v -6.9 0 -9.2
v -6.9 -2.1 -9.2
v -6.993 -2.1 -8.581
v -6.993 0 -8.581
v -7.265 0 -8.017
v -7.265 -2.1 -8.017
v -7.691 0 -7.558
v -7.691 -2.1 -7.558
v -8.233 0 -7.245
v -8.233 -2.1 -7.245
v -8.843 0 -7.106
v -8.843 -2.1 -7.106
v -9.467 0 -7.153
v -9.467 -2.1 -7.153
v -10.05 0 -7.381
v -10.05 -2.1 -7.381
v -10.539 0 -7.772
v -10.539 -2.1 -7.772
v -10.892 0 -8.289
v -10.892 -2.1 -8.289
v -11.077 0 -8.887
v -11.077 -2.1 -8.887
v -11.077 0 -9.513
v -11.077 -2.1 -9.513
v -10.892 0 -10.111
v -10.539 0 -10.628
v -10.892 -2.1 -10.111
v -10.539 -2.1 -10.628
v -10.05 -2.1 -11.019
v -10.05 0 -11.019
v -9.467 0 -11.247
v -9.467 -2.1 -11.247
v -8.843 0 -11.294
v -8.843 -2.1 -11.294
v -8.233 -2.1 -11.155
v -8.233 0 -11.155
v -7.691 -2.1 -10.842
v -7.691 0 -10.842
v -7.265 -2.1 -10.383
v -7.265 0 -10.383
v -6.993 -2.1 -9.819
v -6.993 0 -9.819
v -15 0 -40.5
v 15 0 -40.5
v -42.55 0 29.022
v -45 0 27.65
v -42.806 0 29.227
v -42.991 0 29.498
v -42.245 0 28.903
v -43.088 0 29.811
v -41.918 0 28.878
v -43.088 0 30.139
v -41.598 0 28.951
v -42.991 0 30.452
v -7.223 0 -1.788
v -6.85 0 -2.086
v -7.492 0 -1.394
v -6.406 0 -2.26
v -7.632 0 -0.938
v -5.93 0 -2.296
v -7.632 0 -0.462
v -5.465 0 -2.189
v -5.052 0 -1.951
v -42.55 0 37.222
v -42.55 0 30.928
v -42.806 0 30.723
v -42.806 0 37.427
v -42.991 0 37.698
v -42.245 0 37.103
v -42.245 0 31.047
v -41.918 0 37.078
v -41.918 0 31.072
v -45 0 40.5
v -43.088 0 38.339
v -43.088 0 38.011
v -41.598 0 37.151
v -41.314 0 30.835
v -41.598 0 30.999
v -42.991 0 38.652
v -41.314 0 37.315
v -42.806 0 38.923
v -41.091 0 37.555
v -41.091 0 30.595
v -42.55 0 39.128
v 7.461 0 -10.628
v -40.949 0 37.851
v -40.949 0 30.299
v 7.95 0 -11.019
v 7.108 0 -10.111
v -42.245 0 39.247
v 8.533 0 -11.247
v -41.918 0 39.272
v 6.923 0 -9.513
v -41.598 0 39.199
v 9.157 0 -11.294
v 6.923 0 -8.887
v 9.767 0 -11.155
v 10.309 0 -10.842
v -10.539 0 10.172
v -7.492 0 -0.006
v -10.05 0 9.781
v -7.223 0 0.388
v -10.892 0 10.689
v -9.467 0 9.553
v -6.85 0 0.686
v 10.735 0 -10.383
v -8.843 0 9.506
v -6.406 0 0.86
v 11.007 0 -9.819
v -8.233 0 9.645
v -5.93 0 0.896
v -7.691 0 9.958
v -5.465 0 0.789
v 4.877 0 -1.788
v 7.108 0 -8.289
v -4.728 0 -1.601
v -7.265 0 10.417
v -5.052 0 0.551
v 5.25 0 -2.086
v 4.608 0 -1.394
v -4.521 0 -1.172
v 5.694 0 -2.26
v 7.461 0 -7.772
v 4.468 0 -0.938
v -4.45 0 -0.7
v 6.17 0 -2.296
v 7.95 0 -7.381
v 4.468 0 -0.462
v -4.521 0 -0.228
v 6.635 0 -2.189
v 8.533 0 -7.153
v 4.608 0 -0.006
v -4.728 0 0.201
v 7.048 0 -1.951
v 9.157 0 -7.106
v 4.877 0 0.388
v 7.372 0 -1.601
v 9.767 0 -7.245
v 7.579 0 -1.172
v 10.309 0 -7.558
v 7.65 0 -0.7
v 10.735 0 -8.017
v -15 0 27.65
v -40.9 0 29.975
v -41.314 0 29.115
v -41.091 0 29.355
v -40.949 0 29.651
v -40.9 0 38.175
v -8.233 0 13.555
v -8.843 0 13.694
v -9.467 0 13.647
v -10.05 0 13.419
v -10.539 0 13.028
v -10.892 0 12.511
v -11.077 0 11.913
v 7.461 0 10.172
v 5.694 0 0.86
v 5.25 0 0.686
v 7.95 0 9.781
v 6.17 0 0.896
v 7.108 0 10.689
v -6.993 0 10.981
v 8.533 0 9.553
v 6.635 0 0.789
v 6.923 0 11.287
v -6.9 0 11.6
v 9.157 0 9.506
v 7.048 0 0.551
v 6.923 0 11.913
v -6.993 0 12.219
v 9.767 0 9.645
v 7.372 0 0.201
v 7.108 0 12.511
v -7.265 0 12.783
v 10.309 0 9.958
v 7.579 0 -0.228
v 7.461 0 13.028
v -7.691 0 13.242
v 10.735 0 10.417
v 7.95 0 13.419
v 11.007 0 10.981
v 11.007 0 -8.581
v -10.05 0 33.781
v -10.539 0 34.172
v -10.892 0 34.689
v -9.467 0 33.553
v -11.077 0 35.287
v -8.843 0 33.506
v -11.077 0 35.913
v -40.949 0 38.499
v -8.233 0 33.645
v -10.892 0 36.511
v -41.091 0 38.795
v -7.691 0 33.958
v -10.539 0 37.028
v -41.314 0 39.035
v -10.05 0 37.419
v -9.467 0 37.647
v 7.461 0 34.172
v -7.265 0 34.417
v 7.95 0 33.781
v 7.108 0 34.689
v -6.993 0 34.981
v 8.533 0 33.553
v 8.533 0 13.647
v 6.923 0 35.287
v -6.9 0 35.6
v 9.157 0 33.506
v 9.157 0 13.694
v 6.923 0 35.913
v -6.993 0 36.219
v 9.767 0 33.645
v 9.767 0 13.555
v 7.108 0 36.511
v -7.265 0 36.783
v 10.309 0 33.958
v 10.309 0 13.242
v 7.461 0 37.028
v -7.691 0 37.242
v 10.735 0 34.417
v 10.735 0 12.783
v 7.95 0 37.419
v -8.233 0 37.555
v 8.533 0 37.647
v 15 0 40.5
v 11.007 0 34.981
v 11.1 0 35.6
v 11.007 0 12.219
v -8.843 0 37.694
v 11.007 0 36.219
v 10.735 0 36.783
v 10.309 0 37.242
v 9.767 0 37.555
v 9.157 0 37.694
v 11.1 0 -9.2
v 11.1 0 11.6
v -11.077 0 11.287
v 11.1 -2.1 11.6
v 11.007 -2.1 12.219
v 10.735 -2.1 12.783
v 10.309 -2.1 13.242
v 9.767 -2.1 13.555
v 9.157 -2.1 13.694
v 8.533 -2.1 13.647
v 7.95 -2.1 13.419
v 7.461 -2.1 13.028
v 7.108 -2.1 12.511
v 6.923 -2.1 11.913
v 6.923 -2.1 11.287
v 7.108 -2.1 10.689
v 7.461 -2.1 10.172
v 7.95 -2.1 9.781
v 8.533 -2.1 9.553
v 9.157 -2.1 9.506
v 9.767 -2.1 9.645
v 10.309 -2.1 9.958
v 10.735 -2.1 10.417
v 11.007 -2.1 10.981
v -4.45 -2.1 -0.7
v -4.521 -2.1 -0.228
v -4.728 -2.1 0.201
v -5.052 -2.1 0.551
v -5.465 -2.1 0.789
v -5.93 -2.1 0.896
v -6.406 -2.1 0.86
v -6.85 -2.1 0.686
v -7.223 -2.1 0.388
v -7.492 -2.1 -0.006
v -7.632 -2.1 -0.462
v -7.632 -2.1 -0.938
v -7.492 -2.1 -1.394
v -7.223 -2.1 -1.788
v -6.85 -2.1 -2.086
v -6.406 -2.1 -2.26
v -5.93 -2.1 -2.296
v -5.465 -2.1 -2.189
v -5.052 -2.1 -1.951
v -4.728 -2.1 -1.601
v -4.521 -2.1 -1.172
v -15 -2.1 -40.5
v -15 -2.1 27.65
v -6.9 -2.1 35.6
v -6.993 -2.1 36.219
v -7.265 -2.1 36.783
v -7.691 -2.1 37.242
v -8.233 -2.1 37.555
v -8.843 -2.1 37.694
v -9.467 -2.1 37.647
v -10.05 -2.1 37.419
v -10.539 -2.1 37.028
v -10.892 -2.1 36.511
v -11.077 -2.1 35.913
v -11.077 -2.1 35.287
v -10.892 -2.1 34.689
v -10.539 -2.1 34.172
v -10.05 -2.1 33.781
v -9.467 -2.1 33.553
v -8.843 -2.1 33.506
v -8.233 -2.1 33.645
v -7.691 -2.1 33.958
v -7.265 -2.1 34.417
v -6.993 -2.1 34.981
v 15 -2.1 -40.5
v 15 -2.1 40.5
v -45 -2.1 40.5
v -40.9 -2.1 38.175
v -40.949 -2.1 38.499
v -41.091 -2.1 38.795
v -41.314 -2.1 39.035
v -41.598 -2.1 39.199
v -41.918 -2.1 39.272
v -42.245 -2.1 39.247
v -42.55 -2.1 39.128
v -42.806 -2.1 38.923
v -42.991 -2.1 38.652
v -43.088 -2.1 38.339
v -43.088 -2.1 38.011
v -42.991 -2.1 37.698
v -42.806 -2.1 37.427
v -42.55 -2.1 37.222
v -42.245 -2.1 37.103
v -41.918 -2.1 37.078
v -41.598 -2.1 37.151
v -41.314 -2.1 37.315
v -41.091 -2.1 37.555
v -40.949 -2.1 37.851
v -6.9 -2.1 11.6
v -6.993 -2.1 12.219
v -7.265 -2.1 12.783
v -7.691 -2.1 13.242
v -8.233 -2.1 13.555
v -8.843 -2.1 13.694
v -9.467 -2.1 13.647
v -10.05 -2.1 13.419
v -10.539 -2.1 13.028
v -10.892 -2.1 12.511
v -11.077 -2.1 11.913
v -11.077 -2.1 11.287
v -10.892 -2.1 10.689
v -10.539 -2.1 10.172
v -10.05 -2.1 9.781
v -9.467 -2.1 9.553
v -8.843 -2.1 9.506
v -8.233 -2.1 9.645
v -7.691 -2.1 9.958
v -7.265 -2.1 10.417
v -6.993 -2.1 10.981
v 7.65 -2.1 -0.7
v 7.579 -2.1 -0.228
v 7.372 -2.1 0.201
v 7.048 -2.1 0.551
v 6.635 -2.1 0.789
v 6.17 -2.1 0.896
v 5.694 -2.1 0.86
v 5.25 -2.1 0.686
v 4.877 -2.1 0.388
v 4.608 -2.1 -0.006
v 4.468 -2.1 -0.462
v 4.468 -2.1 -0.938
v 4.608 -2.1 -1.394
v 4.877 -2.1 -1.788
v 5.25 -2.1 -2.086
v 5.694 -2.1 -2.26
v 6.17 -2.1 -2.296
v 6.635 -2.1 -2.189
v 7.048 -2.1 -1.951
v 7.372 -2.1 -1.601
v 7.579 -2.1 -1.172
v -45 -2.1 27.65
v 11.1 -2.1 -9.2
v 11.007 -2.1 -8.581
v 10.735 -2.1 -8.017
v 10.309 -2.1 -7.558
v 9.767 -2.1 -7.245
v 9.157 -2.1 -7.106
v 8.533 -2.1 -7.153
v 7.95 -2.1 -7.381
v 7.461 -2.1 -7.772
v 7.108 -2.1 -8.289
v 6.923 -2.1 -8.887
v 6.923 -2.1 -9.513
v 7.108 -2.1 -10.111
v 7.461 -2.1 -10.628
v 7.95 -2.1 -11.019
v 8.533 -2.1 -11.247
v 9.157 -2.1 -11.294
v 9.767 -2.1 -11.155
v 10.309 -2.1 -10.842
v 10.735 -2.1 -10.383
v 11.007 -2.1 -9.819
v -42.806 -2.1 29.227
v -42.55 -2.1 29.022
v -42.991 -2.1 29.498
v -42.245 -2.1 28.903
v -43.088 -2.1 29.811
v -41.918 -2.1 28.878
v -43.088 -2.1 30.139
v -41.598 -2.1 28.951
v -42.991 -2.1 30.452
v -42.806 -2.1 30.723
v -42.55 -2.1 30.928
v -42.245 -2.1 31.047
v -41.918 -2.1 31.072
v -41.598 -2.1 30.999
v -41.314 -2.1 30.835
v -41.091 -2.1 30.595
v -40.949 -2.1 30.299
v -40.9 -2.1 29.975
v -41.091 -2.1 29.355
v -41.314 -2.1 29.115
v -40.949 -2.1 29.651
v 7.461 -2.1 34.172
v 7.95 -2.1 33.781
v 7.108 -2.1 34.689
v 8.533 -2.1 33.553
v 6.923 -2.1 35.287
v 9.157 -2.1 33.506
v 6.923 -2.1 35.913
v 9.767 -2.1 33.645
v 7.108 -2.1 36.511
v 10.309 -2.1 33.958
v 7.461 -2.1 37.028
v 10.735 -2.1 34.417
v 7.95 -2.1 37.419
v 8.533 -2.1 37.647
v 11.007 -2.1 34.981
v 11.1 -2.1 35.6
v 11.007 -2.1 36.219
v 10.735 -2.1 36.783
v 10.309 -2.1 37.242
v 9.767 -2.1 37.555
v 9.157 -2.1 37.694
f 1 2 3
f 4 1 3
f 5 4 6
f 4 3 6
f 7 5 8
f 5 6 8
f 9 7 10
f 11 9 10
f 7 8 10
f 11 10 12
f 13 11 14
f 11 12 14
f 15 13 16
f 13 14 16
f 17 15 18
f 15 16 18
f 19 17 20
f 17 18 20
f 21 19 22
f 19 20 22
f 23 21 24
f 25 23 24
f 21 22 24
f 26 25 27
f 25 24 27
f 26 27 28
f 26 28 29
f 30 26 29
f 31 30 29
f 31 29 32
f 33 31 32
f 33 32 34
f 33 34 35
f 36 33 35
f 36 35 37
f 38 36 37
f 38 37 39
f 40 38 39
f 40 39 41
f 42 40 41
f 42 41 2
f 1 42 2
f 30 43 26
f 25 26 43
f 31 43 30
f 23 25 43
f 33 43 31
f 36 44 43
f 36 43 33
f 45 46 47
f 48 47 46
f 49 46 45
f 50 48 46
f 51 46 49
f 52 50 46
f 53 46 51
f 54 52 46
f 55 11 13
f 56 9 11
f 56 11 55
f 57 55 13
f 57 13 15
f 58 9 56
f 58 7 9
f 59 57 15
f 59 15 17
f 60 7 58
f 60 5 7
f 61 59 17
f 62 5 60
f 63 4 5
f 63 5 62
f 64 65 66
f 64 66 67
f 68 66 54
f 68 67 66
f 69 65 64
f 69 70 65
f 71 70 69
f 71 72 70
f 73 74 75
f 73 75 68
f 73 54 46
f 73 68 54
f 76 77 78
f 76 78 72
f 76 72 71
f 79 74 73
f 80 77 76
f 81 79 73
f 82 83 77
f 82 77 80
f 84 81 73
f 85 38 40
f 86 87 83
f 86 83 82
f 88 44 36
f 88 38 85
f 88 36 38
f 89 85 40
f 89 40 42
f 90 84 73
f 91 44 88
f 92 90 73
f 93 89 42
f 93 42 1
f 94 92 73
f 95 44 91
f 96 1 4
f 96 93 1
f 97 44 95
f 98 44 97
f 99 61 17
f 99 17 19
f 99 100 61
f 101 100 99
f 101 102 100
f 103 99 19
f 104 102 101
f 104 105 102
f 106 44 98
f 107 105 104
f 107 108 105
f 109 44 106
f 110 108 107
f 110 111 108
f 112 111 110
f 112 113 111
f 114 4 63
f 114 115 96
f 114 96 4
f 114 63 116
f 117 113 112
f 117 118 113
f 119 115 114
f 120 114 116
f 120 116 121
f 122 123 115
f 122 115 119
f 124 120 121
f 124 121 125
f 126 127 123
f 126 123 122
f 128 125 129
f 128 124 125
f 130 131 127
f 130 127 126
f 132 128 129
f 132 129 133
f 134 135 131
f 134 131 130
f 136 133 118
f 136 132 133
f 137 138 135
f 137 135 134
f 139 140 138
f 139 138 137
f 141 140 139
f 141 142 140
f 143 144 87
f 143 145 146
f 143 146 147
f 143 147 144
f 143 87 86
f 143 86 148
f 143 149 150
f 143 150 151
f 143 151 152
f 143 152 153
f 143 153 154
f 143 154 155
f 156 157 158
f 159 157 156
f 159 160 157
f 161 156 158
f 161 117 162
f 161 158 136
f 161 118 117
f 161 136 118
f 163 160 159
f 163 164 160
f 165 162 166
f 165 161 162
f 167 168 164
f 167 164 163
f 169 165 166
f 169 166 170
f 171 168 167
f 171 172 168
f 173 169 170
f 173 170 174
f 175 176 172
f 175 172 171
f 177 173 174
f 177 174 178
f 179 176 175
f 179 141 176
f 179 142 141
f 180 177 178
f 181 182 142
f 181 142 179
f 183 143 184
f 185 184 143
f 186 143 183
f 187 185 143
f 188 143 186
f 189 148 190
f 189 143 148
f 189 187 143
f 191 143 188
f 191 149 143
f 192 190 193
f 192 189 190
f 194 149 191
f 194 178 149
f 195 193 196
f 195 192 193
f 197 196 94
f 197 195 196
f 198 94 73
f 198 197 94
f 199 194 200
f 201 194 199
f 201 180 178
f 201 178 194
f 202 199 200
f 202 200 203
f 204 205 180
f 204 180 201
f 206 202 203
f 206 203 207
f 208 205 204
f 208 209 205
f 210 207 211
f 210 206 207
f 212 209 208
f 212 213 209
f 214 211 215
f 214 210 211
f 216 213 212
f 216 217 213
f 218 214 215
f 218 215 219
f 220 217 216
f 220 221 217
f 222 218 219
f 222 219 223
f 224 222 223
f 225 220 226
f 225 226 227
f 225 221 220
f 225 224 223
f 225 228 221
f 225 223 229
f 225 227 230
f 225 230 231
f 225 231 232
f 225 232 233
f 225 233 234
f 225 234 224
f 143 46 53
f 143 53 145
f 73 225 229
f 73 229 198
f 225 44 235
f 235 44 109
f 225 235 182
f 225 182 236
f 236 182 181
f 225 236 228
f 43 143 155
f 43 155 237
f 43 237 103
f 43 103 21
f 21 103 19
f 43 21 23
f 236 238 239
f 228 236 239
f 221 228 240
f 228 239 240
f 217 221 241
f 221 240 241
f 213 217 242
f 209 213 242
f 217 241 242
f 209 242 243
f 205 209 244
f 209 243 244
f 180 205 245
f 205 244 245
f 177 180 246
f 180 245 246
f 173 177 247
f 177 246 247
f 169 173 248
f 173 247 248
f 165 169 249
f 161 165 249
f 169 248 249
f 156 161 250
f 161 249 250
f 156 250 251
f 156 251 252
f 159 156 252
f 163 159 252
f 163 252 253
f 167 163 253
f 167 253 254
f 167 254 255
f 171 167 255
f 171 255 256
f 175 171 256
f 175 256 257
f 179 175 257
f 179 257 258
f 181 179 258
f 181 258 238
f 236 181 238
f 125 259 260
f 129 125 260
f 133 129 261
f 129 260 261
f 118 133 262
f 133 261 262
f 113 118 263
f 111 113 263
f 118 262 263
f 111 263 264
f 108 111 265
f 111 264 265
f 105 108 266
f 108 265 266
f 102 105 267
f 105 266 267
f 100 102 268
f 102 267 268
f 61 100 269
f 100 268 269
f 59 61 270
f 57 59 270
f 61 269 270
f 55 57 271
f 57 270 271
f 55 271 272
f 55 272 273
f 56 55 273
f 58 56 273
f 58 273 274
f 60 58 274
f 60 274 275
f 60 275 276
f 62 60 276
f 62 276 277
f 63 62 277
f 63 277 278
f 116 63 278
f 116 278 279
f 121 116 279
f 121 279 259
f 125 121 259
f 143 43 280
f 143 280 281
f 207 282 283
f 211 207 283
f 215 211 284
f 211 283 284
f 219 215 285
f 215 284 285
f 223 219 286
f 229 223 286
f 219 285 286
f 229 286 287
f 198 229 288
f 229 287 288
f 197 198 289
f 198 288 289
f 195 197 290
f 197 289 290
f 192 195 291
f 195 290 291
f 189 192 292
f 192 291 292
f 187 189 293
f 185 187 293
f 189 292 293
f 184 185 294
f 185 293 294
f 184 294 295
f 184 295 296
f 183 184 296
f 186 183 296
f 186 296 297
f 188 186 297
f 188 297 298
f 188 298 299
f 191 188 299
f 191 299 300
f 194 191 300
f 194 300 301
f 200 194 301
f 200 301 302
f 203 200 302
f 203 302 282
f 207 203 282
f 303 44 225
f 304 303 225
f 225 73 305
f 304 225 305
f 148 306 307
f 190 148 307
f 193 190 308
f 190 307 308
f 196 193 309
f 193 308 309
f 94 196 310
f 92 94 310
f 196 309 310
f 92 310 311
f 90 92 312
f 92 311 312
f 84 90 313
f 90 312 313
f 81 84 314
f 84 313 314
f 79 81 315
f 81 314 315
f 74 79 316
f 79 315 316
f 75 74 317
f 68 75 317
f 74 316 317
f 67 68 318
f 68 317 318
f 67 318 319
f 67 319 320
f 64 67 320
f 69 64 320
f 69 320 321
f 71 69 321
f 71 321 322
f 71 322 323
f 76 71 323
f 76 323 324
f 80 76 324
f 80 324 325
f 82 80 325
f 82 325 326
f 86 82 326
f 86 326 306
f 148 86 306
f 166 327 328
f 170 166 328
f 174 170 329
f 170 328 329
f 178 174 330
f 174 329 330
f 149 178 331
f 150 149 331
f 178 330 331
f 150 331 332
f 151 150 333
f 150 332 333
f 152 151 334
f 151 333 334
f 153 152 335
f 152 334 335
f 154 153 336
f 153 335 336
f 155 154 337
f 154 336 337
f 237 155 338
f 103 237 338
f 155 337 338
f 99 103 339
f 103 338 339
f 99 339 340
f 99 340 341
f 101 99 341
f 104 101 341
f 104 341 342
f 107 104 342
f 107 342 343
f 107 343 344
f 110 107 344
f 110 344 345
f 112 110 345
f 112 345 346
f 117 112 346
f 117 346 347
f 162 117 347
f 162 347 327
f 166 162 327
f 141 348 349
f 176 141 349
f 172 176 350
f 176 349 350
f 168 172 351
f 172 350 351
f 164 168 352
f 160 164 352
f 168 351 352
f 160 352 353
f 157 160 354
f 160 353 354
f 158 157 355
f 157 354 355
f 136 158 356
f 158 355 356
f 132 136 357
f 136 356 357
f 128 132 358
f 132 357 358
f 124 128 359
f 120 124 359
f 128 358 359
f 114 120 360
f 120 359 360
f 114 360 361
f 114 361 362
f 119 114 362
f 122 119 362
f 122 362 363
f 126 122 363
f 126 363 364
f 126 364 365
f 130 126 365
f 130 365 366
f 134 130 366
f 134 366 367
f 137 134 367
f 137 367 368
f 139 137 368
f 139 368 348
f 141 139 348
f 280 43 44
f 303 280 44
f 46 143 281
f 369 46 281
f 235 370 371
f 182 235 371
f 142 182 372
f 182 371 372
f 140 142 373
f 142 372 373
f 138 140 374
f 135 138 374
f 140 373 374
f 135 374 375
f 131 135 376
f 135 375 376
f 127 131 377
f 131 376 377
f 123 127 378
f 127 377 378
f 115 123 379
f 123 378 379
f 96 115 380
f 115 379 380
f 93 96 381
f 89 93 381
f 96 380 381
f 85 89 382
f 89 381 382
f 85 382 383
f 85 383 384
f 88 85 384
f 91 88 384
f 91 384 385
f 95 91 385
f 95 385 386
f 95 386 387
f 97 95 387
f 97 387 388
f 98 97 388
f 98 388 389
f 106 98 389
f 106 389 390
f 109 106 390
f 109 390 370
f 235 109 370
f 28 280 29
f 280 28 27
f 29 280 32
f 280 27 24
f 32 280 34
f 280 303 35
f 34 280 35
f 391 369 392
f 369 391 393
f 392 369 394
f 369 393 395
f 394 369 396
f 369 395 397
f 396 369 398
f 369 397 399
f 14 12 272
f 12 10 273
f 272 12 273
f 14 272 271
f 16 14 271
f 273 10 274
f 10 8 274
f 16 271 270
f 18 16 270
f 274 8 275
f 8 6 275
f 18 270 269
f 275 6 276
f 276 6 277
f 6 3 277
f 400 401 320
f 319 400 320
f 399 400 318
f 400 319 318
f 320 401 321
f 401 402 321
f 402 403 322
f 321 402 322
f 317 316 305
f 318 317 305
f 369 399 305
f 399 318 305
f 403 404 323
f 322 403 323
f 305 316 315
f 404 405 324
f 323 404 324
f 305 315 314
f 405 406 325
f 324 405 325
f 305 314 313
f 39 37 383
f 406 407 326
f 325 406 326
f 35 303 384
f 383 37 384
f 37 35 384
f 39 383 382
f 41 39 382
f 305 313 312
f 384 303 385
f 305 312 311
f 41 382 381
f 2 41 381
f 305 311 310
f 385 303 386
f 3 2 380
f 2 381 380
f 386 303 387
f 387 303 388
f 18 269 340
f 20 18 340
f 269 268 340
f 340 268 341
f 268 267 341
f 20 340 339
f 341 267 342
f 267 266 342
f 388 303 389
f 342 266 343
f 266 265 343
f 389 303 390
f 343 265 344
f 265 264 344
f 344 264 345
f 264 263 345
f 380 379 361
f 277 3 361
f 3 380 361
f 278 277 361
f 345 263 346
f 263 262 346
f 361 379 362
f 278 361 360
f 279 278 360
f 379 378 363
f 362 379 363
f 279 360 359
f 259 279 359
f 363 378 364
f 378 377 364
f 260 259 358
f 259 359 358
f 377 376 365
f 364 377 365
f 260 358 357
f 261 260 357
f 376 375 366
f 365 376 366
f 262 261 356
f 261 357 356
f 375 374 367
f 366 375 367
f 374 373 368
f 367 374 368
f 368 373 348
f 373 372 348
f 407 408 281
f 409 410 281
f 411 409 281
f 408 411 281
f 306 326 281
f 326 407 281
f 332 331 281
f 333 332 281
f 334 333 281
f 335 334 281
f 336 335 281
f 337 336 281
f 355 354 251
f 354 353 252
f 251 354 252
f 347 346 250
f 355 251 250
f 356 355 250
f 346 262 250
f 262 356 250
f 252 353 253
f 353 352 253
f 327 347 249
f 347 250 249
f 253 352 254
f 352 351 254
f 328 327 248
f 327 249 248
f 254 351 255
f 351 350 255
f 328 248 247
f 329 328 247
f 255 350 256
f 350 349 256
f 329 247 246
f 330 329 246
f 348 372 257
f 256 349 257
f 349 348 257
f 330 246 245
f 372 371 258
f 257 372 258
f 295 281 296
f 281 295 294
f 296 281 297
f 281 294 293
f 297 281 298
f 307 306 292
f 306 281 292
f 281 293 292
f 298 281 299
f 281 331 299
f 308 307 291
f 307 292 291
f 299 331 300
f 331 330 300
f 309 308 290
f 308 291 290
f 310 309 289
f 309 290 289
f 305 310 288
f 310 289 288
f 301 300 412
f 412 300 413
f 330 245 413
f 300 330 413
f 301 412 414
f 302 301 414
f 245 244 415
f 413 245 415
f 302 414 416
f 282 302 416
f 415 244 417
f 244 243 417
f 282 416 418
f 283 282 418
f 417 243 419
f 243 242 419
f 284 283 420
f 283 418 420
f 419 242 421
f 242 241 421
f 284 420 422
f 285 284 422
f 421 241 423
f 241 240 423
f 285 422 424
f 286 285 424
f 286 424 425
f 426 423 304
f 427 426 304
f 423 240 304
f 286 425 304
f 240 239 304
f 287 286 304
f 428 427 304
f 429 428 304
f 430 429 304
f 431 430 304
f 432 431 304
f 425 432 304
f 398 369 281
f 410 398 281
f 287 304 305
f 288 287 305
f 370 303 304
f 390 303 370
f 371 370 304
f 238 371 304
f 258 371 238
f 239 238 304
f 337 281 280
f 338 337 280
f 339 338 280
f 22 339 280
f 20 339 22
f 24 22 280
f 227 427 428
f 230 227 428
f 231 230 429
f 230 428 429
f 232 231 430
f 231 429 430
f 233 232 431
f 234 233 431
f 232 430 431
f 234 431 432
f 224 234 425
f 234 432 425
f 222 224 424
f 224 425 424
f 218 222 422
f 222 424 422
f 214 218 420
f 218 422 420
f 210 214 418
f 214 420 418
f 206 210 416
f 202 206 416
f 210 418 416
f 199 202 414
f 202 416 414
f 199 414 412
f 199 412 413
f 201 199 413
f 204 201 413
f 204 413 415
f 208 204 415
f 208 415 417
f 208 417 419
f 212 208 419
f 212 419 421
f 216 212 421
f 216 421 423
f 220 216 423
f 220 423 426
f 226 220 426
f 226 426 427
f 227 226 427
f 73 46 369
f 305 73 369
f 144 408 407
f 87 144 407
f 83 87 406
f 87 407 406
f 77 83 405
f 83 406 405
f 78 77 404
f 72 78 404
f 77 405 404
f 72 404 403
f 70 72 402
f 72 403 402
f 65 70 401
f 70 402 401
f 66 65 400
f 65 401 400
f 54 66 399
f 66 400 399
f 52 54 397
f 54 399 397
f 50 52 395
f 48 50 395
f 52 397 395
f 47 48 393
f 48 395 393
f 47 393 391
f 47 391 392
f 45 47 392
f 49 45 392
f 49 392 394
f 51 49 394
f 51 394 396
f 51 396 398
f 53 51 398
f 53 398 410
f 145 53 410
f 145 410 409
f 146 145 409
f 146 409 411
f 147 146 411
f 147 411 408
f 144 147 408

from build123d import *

# Parameters (mm, degrees)
F0_W     = 30
F0_H     = 81
F1_DEPTH = 2.1
F2_R     = 2.1
F2_R_2   = 1.6
F3_DEPTH = 2.101
F4_W     = 2.1
F4_H     = 12.85
F5_DEPTH = 30
F6_R     = 1.1
F7_DEPTH = 25


with BuildPart() as f1:
    # F0 (on Front) → F1 (new body)
    with BuildSketch(Plane.XZ):
        Rectangle(F0_W, F0_H)
    extrude(amount=F1_DEPTH)

    # F2 (on face) → F3 (cut, through all)
    with BuildSketch(Plane.XZ.offset(2.1)):
        with Locations((9, 35.6)):
            Circle(F2_R)
        with Locations((9, 11.6)):
            Circle(F2_R)
        with Locations((-9, 35.6)):
            Circle(F2_R)
        with Locations((-9, 11.6)):
            Circle(F2_R)
        with Locations((9, -9.2)):
            Circle(F2_R)
        with Locations((-9, -9.2)):
            Circle(F2_R)
        with Locations((6.05, -0.7)):
            Circle(F2_R_2)
        with Locations((-6.05, -0.7)):
            Circle(F2_R_2)
    extrude(amount=-F3_DEPTH, mode=Mode.SUBTRACT)

    # F4 (on face) → F5 (join)
    with BuildSketch(Plane(origin=(-15, 0, 0), x_dir=(0, -1, 0), z_dir=(-1, 0, 0))):
        with Locations((1.05, 34.075)):
            Rectangle(F4_W, F4_H)
    extrude(amount=F5_DEPTH)

    # F6 (on face) → F7 (cut)
    with BuildSketch(Plane.XZ.offset(2.1)):
        with Locations((-42, 38.175)):
            Circle(F6_R)
        with Locations((-42, 29.975)):
            Circle(F6_R)
    extrude(amount=-F7_DEPTH, mode=Mode.SUBTRACT)


solid = f1.part
